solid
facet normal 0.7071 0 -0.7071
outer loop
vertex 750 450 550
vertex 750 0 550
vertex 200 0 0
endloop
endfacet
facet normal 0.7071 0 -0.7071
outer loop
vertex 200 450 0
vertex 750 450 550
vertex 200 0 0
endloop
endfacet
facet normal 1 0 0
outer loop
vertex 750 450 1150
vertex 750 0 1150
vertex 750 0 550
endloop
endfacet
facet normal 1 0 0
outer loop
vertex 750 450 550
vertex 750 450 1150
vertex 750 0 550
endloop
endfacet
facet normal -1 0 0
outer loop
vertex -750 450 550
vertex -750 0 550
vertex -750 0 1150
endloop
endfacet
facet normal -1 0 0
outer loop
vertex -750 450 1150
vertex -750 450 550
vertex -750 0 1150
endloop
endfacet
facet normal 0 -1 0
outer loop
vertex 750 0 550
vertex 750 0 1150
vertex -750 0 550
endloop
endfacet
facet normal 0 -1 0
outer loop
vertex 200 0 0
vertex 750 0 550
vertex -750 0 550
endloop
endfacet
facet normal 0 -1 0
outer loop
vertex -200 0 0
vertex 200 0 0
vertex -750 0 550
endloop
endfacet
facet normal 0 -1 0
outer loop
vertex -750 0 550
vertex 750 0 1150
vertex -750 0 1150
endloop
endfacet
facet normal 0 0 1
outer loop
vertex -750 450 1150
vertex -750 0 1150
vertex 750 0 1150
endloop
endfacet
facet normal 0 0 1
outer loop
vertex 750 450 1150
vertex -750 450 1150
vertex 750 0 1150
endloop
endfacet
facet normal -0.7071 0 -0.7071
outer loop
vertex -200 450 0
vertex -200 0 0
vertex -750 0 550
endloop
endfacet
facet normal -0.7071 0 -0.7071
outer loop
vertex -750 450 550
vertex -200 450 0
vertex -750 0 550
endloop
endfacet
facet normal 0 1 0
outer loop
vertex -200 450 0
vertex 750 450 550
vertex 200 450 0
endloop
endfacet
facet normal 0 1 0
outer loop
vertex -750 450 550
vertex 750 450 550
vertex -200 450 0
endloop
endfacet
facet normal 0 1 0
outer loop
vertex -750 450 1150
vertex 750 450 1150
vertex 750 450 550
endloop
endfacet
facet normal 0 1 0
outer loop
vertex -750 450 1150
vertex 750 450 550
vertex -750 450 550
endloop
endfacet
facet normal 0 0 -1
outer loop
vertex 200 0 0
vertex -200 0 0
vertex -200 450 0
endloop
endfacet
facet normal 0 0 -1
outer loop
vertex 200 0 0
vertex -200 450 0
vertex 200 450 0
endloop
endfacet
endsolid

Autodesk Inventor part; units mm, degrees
ref_plane "YZ Plane" through (0, 0, 0) normal (1, 0, 0) x (0, 1, 0)
ref_plane "XZ Plane" through (0, 0, 0) normal (0, 1, 0) x (-1, 0, 0)
ref_plane "XY Plane" through (0, 0, 0) normal (0, 0, 1) x (1, 0, 0)
sketch "Sketch1" plane through (0, 0, 0) normal (0, 1, 0) x (-1, 0, 0)
  line L0 (200, 0) -> (-200, 0)
  line L1 (200, 0) -> (750, 550)
  line L2 (750, 550) -> (750, 1150)
  line L3 (750, 1150) -> (-750, 1150)
  line L4 (-750, 1150) -> (-750, 550)
  line L5 (-750, 550) -> (-200, 0)
  point P0 (0, 0)
  point P1 (0, 0)
  point P2 (0, 1150)
  dimension "d0" = 400
  dimension "d1" = 1150
  dimension "d2" = 600
  dimension "d3" = 1500
extrude "Extrusion1" add sketch "Sketch1" along normal blind 450
properties part number "DUMMY 2"
